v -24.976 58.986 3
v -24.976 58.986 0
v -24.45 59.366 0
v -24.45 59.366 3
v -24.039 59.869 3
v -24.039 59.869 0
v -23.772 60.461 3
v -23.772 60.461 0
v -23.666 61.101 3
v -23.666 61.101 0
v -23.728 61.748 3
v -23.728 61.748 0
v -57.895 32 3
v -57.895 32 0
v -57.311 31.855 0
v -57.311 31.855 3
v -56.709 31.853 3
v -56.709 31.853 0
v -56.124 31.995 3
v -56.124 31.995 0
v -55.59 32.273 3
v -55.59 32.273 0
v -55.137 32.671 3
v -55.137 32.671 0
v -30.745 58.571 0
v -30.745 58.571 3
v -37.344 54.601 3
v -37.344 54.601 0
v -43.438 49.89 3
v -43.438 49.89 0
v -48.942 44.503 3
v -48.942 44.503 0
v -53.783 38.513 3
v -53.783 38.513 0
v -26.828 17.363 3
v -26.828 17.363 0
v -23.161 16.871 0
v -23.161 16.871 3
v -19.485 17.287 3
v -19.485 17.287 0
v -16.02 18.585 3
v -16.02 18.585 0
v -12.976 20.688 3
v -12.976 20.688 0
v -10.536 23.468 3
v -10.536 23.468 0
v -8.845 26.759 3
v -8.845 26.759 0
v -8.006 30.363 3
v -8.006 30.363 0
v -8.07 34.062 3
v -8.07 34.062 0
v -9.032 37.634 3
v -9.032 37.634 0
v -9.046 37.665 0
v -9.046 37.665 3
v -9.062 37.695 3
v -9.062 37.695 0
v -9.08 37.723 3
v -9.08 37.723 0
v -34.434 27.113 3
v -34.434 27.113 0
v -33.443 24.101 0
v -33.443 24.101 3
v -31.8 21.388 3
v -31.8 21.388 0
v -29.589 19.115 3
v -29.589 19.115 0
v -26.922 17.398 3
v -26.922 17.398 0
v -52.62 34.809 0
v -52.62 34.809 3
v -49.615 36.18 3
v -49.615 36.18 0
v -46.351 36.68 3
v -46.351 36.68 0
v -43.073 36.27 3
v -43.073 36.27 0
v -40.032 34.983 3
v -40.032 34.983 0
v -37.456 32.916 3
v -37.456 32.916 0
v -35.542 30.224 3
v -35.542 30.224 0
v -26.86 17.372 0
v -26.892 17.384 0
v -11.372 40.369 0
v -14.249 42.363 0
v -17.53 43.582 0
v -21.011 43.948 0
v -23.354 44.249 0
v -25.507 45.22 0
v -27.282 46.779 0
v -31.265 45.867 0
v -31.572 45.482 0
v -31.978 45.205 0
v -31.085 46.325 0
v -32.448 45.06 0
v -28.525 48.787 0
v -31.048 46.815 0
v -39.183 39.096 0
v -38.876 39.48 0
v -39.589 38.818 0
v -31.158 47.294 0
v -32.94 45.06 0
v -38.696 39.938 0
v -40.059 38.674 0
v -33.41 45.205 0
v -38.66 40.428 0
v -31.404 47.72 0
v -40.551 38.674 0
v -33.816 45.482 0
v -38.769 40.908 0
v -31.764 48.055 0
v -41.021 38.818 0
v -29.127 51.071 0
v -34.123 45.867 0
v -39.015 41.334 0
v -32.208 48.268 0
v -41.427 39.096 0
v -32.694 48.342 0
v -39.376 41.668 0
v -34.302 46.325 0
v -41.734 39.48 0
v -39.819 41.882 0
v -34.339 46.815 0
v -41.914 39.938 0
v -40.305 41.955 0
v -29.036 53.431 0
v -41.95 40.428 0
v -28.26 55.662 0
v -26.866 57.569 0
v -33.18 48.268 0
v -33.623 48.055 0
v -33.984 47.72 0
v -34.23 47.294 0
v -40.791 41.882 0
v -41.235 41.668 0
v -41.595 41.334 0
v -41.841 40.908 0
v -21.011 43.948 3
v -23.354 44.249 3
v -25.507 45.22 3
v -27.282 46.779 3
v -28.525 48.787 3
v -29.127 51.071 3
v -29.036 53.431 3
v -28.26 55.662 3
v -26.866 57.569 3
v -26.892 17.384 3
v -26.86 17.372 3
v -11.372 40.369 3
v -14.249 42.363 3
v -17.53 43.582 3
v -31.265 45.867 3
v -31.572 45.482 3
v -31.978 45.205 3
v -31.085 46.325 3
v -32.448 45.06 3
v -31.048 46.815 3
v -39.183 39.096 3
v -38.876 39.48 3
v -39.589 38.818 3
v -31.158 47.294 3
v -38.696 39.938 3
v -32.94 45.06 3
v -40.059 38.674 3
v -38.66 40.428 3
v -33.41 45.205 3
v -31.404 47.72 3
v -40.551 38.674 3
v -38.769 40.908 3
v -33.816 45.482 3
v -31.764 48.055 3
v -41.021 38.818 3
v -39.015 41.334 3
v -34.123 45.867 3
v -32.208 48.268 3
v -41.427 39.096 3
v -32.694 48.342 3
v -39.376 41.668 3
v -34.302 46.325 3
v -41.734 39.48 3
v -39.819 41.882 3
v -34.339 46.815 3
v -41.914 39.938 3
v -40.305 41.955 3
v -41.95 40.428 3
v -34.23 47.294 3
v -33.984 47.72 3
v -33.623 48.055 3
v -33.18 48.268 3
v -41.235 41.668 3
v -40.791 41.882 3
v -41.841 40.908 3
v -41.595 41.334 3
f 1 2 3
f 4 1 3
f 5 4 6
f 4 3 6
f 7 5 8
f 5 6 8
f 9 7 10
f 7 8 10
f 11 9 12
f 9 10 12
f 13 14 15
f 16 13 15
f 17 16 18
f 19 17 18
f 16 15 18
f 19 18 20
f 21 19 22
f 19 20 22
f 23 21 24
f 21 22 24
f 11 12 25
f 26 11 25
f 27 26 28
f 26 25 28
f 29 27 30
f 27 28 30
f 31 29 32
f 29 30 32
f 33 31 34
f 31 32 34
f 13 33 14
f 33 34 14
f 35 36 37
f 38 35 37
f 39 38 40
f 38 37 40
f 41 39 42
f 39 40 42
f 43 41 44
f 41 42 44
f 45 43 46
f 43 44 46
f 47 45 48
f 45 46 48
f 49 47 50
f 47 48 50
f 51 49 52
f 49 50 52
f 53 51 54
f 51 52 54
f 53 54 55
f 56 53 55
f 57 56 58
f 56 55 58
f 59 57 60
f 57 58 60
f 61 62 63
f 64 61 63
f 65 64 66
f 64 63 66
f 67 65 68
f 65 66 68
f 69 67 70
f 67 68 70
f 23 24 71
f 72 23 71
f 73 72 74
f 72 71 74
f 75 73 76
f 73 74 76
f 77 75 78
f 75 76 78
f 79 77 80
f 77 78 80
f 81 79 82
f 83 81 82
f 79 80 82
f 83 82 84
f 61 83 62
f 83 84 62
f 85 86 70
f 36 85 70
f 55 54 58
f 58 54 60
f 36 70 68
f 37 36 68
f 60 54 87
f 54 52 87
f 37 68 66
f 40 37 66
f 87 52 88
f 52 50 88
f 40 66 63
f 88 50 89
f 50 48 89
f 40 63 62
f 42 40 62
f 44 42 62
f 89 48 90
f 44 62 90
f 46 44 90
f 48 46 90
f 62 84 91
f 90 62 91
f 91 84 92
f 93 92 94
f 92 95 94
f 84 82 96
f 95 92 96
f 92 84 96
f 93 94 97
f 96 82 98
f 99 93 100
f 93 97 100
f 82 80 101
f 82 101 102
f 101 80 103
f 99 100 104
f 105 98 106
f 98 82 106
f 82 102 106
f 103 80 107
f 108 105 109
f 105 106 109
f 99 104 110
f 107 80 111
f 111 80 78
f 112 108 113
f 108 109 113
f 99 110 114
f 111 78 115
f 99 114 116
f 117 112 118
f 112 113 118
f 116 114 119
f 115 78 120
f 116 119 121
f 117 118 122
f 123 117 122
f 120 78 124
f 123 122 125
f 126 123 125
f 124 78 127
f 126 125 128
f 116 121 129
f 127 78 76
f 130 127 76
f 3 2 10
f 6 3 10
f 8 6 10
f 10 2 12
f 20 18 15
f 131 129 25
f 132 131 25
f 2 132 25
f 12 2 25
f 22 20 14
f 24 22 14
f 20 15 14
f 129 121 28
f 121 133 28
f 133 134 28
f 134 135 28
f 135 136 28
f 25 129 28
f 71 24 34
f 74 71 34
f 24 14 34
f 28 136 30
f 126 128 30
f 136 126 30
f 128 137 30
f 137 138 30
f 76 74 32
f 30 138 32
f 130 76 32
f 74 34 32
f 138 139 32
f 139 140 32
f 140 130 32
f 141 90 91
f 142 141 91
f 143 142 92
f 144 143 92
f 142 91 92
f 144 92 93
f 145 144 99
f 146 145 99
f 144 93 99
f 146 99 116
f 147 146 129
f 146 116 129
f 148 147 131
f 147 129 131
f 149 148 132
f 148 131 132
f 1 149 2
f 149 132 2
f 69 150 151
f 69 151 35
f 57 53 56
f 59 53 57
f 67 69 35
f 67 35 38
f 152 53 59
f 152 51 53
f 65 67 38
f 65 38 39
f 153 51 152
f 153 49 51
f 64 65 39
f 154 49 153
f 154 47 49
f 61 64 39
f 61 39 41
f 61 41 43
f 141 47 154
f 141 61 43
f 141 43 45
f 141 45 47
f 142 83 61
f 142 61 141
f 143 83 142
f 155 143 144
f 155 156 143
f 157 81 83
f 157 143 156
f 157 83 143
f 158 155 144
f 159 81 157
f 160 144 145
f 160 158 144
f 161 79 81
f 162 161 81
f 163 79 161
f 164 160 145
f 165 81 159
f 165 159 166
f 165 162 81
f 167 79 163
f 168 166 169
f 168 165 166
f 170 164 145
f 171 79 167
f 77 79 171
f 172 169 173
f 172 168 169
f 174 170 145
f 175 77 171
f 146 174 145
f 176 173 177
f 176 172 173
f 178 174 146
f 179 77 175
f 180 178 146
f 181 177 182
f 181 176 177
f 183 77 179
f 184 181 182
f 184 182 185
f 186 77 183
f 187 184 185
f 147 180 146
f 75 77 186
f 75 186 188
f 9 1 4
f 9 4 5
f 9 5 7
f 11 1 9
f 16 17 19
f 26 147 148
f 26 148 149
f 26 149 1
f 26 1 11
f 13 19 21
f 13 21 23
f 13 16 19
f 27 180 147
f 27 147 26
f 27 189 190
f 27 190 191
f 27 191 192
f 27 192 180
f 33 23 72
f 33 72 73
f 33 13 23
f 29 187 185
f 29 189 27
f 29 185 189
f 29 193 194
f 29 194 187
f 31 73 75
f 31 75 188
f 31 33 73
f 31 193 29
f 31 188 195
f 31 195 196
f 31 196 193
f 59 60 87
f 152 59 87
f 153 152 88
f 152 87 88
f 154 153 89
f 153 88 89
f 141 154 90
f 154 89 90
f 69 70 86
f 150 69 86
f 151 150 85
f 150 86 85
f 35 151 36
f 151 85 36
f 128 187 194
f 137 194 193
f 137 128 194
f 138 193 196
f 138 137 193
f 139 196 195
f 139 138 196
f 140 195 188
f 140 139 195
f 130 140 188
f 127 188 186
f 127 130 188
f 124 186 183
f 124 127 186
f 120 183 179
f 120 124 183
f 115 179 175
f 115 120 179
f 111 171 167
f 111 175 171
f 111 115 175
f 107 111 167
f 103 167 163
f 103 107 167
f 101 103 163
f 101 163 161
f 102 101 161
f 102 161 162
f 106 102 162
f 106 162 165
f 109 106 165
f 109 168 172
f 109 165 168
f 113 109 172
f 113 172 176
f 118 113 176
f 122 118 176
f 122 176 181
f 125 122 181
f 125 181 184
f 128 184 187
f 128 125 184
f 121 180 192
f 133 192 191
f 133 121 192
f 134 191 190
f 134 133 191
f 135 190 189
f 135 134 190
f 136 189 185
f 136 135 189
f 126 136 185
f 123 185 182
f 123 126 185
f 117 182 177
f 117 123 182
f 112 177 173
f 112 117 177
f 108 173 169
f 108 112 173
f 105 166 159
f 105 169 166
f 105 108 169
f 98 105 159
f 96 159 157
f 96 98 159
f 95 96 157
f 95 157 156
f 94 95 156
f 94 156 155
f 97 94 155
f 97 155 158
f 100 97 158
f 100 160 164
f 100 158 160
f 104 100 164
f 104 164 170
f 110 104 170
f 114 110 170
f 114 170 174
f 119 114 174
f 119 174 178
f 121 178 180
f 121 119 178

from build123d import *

# Parameters (mm, degrees)
BOSS_EXTRUDE1_DEPTH = 3
SKETCH4_R           = 1.65
CUT_EXTRUDE1_DEPTH  = 4


with BuildPart() as part:
    # Sketch5 → Boss-Extrude1 (new body)
    with BuildSketch(Plane(origin=(0, 0, 0), x_dir=(0, 1, 0), z_dir=(0, 0, 1))):
        with BuildLine():
            ThreePointArc((37.723245901, 9.079766174), (42.363354518, 14.24854402), (43.948073482, 21.011349518))
            ThreePointArc((43.948073482, 21.011349518), (49.906664226, 28.911044217), (58.985716635, 24.976481046))
            ThreePointArc((58.985716635, 24.976481046), (60.156028849, 23.886109344), (61.747774642, 23.728354912))
            ThreePointArc((61.747774642, 23.728354912), (49.889938389, 43.437501627), (32.000159984, 57.894837948))
            ThreePointArc((32.000159984, 57.894837948), (31.906399176, 56.411758551), (32.670933348, 55.137473226))
            ThreePointArc((32.670933348, 55.137473226), (36.27043514, 43.073301984), (27.113180378, 34.433549317))
            ThreePointArc((27.113180378, 34.433549317), (21.388023687, 31.800064681), (17.397863538, 26.922433858))
            ThreePointArc((17.397863538, 26.922433858), (17.377786203, 26.87598895), (17.362505758, 26.82775269))
            ThreePointArc((17.362505758, 26.82775269), (22.00306193, 11.670310925), (37.63394302, 9.032440796))
            ThreePointArc((37.63394302, 9.032440796), (37.679793297, 9.053841282), (37.723245901, 9.079766174))
        make_face()
    extrude(amount=BOSS_EXTRUDE1_DEPTH)

    # Sketch4 → Cut-Extrude1 (cut, through all)
    with BuildSketch(Plane(origin=(0, 0, 0), x_dir=(0, 1, 0), z_dir=(0, 0, 1))):
        with Locations((40.305086528, 40.305086528)):
            Circle(SKETCH4_R)
        with Locations((46.691666524, 32.693856872)):
            Circle(SKETCH4_R)
    extrude(amount=CUT_EXTRUDE1_DEPTH, mode=Mode.SUBTRACT)


solid = part.part
